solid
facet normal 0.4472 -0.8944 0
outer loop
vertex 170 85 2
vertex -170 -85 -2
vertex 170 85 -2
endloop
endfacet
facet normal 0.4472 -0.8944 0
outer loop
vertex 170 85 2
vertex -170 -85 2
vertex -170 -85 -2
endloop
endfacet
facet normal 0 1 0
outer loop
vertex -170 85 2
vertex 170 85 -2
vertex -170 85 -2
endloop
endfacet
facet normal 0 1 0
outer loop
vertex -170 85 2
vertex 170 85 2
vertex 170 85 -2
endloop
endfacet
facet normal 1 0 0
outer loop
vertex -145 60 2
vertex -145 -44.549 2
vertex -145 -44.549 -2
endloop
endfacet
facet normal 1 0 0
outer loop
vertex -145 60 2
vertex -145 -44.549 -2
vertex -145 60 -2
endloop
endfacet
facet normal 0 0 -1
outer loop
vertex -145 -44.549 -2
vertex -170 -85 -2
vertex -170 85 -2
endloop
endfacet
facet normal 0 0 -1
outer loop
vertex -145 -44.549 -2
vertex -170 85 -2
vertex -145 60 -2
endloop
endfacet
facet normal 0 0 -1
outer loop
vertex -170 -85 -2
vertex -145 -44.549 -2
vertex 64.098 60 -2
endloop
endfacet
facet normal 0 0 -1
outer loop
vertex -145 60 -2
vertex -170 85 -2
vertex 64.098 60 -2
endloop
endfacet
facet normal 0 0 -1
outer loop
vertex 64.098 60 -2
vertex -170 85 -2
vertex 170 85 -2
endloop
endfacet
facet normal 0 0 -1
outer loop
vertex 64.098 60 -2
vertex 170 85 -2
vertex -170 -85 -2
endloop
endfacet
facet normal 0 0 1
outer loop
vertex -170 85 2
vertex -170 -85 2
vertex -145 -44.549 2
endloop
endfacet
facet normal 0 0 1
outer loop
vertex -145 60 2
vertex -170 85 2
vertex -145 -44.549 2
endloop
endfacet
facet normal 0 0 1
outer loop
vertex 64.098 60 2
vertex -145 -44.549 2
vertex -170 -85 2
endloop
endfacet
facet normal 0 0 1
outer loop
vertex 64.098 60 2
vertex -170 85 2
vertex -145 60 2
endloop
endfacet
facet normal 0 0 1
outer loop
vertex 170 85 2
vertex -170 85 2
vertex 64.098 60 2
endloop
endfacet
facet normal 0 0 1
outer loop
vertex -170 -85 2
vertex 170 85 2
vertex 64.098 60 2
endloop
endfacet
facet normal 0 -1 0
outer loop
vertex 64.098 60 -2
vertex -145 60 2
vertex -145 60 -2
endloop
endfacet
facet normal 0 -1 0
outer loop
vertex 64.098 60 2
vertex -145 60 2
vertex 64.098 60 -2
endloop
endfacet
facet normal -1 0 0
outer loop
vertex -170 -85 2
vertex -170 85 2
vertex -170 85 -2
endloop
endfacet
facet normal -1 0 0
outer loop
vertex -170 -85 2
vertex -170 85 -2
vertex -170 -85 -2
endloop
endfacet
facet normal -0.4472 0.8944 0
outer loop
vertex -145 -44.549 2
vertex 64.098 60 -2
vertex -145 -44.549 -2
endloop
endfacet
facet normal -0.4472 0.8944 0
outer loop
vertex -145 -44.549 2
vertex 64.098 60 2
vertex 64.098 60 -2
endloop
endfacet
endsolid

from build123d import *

# Parameters (mm, degrees)
F1_DEPTH = 2


with BuildPart() as f1:
    # F0 (on Top) → F1 (new body, symmetric)
    with BuildSketch(Plane.XY):
        Polygon((170, 85), (-170, 85), (-170, -85), align=None)
        Polygon((-145, -44.5491502813), (-145, 60), (64.0983005625, 60), align=None, mode=Mode.SUBTRACT)
    extrude(amount=F1_DEPTH, both=True)


solid = f1.part
